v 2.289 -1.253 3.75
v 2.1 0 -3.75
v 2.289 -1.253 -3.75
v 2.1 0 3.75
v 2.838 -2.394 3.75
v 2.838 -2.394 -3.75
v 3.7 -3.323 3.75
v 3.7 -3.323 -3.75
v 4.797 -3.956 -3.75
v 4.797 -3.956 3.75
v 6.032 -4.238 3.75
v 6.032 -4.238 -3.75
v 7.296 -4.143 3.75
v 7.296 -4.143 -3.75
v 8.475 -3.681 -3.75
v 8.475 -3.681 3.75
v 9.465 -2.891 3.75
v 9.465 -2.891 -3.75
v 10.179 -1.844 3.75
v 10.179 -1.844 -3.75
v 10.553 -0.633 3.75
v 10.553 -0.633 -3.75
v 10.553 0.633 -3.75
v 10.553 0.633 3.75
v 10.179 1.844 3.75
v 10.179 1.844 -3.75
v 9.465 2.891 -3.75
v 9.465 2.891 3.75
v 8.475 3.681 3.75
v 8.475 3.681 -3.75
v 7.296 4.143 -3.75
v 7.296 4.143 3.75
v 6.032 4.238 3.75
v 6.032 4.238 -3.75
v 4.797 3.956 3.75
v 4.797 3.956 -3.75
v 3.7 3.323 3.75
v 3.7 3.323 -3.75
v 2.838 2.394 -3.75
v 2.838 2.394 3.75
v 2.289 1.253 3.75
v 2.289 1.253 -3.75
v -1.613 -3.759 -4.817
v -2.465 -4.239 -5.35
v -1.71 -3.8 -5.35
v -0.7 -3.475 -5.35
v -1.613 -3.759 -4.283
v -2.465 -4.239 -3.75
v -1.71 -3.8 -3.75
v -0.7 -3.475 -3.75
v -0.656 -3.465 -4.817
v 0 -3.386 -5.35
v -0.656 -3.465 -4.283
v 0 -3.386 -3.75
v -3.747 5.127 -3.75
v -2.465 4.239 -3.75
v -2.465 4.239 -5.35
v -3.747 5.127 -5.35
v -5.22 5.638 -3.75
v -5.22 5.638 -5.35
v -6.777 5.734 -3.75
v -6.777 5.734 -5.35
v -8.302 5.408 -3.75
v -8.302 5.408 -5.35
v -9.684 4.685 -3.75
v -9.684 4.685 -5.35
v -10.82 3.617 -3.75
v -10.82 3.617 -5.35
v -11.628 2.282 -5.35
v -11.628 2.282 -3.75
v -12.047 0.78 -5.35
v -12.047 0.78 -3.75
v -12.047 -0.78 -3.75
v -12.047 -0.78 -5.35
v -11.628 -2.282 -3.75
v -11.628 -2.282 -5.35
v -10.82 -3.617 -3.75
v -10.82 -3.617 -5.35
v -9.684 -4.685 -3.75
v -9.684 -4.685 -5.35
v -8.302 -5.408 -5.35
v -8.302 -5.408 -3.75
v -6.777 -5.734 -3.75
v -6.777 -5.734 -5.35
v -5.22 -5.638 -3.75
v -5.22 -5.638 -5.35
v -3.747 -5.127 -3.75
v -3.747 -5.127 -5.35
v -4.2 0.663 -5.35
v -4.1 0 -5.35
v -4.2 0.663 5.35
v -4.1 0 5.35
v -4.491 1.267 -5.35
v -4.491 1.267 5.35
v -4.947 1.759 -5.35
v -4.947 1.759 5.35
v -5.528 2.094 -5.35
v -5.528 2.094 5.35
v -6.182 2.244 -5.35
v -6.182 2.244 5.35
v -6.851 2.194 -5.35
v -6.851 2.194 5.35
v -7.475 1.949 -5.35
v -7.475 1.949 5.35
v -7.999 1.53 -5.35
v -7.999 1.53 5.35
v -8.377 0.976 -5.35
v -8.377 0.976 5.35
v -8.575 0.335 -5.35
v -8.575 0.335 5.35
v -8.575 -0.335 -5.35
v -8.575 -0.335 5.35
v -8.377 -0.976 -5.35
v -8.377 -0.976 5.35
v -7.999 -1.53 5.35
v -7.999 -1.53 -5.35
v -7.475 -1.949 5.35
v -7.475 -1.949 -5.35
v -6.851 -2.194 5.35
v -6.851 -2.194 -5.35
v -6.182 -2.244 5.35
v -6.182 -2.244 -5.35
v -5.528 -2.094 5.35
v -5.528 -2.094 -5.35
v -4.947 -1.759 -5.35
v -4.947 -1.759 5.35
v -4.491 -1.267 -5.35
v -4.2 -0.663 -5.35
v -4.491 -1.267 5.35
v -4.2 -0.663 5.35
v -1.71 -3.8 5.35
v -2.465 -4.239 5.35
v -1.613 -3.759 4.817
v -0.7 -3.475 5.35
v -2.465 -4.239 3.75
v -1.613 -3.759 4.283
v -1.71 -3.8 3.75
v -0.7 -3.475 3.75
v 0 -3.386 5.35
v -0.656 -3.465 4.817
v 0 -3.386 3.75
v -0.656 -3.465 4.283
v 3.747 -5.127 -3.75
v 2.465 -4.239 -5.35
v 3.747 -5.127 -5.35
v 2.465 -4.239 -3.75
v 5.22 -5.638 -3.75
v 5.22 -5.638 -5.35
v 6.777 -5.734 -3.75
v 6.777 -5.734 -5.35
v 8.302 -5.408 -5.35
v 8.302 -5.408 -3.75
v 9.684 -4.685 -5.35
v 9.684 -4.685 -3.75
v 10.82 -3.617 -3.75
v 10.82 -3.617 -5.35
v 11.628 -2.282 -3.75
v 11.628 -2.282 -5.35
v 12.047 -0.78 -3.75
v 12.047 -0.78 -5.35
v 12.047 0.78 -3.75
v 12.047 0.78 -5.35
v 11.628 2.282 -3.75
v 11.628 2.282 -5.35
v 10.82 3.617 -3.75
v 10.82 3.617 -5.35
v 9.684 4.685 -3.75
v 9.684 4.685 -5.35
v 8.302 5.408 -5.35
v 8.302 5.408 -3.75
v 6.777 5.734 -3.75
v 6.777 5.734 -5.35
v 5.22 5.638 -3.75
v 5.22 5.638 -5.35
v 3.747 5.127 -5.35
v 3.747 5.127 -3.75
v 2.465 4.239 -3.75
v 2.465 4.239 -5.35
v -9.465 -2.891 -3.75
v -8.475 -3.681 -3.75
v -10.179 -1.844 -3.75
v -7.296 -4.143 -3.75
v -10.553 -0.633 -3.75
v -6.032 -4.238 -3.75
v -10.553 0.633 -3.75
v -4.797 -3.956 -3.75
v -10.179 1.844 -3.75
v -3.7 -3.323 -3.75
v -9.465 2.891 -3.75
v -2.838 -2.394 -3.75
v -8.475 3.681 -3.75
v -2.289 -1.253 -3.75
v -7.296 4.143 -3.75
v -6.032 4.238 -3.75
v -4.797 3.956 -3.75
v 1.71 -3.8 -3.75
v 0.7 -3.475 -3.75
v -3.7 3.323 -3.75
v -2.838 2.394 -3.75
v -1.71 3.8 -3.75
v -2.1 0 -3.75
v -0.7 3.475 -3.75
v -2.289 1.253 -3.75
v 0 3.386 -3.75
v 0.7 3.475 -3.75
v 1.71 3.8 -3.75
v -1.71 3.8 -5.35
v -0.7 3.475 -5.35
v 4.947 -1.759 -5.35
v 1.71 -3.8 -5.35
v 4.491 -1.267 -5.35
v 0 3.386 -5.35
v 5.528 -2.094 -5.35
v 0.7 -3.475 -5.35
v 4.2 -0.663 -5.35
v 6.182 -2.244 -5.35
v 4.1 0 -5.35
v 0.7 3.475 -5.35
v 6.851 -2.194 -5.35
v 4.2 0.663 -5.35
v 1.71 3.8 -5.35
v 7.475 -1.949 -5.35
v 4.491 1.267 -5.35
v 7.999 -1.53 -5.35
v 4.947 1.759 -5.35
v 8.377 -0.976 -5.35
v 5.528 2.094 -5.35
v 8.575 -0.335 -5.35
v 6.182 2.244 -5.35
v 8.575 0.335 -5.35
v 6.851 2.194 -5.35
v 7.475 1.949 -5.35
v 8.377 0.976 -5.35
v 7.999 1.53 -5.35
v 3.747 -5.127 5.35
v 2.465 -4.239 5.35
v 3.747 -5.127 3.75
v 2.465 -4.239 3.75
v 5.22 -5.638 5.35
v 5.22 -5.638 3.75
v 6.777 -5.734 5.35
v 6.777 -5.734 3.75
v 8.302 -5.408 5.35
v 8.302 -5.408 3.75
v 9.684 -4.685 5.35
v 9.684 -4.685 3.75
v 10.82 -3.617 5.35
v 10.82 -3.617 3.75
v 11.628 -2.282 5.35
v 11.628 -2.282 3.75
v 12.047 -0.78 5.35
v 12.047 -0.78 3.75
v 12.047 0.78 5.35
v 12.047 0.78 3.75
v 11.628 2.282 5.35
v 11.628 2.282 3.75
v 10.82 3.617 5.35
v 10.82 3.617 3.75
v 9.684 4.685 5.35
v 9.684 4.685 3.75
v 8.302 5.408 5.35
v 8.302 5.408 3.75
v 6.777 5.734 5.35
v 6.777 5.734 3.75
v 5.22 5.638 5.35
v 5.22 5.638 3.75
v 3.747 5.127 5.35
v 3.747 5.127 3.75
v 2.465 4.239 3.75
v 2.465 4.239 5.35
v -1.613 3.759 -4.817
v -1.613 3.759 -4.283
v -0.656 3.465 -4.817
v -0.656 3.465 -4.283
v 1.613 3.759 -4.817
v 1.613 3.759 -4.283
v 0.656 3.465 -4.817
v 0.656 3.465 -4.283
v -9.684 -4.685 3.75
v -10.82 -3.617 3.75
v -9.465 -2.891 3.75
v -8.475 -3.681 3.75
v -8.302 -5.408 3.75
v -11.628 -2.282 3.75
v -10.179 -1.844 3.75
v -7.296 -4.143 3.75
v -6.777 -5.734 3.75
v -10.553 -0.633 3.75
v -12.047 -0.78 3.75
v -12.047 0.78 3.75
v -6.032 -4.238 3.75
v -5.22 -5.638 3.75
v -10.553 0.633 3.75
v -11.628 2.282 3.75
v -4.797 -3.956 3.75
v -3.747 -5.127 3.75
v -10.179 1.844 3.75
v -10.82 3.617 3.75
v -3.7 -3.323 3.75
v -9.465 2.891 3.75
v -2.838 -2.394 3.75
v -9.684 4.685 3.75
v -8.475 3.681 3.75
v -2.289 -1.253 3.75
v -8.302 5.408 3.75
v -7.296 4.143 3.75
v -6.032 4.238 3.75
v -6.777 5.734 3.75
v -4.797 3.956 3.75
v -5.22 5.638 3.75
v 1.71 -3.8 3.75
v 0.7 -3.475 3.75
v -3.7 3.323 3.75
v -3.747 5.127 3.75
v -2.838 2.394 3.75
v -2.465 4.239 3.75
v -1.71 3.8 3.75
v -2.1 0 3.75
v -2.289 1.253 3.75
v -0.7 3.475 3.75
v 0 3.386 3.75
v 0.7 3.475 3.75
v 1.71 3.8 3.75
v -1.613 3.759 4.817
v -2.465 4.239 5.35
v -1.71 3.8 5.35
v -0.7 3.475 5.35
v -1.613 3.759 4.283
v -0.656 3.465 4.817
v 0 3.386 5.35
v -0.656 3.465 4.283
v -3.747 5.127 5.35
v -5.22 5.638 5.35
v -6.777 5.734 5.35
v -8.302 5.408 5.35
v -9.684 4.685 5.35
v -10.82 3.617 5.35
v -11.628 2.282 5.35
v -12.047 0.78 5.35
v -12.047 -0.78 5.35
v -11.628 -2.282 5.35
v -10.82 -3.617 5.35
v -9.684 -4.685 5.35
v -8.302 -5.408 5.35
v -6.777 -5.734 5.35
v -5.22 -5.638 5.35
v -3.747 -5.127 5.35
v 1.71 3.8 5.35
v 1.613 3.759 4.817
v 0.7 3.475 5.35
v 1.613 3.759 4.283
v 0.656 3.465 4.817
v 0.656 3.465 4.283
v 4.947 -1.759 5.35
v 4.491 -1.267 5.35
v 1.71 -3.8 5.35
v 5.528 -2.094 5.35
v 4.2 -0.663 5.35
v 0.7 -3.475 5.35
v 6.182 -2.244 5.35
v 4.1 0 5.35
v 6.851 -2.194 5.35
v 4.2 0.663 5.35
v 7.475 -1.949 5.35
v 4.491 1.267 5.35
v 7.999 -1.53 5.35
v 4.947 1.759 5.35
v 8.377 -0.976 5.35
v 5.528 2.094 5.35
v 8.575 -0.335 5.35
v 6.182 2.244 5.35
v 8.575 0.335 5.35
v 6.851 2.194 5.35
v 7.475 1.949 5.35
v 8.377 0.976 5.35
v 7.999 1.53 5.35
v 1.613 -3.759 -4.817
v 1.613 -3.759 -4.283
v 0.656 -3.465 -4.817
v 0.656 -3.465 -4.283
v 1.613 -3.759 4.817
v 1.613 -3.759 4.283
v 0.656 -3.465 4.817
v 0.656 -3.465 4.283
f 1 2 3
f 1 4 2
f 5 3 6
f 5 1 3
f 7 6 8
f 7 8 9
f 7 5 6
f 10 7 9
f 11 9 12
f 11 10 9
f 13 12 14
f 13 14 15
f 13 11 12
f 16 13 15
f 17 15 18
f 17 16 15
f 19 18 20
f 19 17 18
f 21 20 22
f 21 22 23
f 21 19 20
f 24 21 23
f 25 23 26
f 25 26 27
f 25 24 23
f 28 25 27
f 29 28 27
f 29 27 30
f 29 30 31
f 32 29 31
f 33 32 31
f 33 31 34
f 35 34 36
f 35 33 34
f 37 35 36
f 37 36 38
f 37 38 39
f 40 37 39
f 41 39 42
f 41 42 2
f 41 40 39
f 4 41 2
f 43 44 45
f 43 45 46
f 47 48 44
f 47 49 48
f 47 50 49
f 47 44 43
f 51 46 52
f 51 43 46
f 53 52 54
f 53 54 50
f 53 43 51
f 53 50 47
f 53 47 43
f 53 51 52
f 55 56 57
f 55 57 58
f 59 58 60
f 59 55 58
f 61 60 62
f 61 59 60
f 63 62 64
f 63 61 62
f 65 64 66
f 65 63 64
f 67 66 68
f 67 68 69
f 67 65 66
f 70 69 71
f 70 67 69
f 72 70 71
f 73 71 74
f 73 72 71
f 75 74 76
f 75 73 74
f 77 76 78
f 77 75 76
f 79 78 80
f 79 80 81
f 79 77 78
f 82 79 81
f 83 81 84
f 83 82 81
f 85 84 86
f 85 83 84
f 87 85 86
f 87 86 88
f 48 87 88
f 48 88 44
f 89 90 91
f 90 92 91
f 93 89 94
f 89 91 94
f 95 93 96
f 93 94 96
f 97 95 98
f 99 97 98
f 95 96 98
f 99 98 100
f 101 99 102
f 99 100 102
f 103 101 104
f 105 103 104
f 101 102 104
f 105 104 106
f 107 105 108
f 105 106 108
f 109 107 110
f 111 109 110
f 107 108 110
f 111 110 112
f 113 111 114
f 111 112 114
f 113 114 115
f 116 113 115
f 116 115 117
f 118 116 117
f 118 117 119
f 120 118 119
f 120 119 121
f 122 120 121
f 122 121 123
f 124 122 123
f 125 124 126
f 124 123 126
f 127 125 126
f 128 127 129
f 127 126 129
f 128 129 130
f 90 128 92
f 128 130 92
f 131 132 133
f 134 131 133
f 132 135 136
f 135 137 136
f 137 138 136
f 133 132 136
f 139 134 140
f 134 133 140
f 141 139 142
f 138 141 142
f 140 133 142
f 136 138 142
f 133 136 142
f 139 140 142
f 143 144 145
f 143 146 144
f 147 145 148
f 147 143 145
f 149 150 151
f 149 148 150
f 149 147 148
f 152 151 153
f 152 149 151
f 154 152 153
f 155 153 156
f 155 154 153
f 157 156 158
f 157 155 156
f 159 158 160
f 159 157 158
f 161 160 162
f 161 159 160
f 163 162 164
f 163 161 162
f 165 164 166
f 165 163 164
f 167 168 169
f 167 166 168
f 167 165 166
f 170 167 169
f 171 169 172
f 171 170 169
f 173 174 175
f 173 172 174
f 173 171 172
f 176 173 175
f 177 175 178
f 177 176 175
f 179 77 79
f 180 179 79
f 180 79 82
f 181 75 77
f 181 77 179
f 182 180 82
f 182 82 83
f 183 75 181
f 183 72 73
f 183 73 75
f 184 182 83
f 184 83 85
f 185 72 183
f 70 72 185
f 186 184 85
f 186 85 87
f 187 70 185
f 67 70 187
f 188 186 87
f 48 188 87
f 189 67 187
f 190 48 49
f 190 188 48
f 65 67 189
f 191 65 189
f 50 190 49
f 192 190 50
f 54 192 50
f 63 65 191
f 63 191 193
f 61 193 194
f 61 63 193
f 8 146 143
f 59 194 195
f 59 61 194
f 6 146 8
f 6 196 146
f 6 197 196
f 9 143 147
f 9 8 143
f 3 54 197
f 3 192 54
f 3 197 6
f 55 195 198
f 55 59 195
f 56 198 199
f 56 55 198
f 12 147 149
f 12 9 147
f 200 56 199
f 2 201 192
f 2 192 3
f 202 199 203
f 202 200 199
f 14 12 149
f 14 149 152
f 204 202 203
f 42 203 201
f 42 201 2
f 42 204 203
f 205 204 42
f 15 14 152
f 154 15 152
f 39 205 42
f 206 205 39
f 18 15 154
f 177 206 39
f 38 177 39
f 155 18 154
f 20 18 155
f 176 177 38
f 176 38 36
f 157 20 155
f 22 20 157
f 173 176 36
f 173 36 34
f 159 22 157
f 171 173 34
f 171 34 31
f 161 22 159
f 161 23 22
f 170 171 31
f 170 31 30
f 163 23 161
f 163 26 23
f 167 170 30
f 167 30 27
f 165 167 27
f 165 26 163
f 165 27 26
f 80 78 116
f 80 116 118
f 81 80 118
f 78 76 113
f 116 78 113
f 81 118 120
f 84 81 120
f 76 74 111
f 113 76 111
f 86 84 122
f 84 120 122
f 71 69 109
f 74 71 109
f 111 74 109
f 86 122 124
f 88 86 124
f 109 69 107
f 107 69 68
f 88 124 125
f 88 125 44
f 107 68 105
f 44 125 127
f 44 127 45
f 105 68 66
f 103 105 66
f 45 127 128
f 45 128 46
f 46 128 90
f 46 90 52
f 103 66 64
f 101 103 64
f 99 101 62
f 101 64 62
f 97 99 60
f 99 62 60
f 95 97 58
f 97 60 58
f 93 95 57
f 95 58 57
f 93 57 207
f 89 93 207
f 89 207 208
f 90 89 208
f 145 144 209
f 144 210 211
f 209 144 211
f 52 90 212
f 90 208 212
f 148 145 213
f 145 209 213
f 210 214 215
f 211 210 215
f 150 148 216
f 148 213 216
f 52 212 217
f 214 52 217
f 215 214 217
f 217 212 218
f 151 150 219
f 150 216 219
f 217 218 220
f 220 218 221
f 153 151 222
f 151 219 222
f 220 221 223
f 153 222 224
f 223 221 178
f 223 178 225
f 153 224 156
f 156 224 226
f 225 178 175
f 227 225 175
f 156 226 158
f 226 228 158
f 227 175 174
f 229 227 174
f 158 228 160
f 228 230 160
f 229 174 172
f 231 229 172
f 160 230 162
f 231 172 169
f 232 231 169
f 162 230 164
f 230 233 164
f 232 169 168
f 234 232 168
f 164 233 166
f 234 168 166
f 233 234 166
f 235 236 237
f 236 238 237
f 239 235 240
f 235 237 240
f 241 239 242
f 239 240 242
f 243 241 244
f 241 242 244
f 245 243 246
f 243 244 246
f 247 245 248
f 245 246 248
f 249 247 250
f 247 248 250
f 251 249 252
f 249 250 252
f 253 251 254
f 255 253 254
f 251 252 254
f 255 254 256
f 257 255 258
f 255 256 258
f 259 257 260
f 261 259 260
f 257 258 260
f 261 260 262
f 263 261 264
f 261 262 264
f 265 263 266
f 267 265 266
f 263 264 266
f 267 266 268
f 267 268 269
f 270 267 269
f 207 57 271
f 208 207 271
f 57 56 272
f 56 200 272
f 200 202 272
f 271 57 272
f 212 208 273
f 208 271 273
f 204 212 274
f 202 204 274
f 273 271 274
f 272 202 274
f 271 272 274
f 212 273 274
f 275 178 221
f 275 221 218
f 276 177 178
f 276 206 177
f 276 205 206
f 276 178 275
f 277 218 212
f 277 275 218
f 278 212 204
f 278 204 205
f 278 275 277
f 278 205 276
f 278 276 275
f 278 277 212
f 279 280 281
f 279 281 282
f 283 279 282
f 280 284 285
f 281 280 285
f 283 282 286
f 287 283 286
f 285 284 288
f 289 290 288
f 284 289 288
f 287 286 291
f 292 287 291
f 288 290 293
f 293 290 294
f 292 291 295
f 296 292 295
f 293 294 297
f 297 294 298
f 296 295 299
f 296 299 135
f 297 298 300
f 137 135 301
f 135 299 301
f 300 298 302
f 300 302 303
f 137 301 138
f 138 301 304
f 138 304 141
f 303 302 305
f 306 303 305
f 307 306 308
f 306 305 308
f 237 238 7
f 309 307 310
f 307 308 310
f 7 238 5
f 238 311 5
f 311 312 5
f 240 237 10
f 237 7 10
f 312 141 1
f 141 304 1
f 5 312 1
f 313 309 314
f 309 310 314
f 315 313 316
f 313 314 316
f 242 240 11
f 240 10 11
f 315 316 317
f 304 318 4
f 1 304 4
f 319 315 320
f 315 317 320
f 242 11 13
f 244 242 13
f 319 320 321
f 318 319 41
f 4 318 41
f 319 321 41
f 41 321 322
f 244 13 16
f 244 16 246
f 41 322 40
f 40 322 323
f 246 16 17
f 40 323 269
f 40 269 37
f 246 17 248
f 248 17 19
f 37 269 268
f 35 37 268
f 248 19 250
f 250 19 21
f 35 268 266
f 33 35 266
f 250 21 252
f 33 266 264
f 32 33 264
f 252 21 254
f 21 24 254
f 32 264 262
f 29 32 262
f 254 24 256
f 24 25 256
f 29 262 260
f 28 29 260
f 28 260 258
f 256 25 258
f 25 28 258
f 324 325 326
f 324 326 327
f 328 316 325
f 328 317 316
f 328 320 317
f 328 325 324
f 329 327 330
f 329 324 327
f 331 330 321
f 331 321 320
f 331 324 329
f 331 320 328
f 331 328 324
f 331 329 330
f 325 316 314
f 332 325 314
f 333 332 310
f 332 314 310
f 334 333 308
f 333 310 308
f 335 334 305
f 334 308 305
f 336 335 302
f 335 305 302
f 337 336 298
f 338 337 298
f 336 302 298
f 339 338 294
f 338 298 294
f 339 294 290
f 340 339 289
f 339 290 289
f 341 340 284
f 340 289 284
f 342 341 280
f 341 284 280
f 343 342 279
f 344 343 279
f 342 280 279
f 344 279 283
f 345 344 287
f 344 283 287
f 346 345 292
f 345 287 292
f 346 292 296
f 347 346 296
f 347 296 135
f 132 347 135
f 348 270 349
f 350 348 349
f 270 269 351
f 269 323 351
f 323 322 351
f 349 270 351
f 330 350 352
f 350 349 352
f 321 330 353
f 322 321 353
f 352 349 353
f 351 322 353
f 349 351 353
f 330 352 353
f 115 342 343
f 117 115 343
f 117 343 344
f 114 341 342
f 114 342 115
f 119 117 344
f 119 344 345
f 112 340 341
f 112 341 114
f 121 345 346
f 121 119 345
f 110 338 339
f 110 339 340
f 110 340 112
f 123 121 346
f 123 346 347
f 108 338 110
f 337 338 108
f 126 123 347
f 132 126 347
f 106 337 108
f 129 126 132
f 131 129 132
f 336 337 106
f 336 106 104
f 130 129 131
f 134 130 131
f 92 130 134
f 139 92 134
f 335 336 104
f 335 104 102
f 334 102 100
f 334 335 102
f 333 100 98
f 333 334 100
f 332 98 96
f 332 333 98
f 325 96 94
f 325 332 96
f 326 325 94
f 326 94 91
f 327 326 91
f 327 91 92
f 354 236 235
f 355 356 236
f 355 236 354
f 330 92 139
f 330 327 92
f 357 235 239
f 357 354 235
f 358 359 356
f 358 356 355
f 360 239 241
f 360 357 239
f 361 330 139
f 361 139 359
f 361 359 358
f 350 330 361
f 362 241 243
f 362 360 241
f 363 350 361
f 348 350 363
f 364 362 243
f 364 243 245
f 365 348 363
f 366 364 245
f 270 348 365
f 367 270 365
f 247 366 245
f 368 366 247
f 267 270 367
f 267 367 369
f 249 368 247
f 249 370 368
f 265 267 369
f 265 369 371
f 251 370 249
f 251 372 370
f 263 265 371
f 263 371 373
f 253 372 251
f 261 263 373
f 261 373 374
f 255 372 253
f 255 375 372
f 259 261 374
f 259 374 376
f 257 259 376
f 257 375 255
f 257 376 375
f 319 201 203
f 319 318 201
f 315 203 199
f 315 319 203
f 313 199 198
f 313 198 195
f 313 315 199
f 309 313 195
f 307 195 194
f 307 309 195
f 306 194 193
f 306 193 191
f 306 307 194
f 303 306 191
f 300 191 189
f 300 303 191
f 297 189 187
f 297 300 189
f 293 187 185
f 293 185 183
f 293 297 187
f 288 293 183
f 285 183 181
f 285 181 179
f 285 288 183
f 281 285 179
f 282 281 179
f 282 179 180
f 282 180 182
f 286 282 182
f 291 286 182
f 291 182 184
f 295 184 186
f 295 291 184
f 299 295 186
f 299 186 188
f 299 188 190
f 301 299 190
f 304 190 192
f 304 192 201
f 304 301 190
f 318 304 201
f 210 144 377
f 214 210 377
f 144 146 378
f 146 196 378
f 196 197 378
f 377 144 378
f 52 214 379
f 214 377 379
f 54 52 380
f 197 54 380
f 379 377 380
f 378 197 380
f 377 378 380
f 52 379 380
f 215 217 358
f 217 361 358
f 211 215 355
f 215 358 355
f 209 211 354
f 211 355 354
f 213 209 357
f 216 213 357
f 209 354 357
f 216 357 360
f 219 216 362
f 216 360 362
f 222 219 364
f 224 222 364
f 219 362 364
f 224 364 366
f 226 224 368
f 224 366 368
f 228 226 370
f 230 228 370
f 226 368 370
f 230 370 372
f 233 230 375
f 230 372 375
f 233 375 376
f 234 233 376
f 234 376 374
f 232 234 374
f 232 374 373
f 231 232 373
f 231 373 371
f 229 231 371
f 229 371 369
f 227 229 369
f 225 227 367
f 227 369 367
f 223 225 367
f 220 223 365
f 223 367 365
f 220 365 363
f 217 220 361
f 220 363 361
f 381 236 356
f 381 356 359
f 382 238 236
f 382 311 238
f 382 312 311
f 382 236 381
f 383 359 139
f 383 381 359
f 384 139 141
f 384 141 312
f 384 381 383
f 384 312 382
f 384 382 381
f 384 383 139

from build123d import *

# Parameters (mm, degrees)
SKETCH_1_R        = 4.25
SKETCH_1_R_2      = 2.25
EXTRUDE_1_DEPTH   = 3.75
EXTRUDE_1_2_DEPTH = 3.75
SKETCH_2_R        = 5.75
SKETCH_2_R_2      = 4.25
SKETCH_2_R_3      = 2.25
EXTRUDE_3_DEPTH   = 1.6


with BuildPart() as part:
    # 草图1 → 凸台-拉伸1 (new body)
    with BuildSketch(Plane.XY):
        with Locations((-6.35, 0)):
            Circle(SKETCH_1_R)
        with Locations((-6.35, 0)):
            Circle(SKETCH_1_R_2, mode=Mode.SUBTRACT)
    extrude_1 = extrude(amount=EXTRUDE_1_DEPTH)



with BuildPart() as body_2:
    # 草图1 → Extrude 1 2 (new body)
    with BuildSketch(Plane.XY):
        with Locations(Location((6.35, 0, 0), (0, 0, 180))):
            Circle(SKETCH_1_R)
        with Locations(Location((6.35, 0, 0), (0, 0, 180))):
            Circle(SKETCH_1_R_2, mode=Mode.SUBTRACT)
    extrude_1_2 = extrude(amount=EXTRUDE_1_2_DEPTH)


with BuildPart() as part_1:
    add(part.part)

    add(body_2.part)  # 凸台-拉伸3 merges body 2
    # 草图2 → 凸台-拉伸3 (add)
    # profile 1 of 4: a face of its own
    with BuildSketch(Plane.XY.offset(3.75)):
        with Locations((-6.35, 0)):
            Circle(SKETCH_2_R)
        with Locations((-6.35, 0)):
            Circle(SKETCH_2_R_2, mode=Mode.SUBTRACT)
    # profile 2 of 4: a face of its own
    with BuildSketch(Plane.XY.offset(3.75)):
        with Locations((-6.35, 0)):
            Circle(SKETCH_2_R_2)
        with Locations((-6.35, 0)):
            Circle(SKETCH_2_R_3, mode=Mode.SUBTRACT)
    # profile 3 of 4: a face of its own
    with BuildSketch(Plane.XY.offset(3.75)):
        with BuildLine():
            ThreePointArc((-2.464522189, 4.238580208), (-1.086731177, 2.315275641), (-0.6, 0))
            ThreePointArc((-0.6, 0), (-1.086731177, -2.315275641), (-2.464522189, -4.238580208))
            add(Edge.make_bspline(
                [(-2.464522189, -4.238580208), (-1.801147303, -3.67793909), (-0.370790644, -3.34588107), (0, -3.386350938)],
                knots=[0, 0, 0, 0, 1, 1, 1, 1], degree=3))
            add(Edge.make_bspline(
                [(2.464522189, -4.238580208), (1.801147303, -3.67793909), (0.370790644, -3.34588107), (0, -3.386350938)],
                knots=[0, 0, 0, 0, 1, 1, 1, 1], degree=3))
            ThreePointArc((2.464522189, -4.238580208), (0.6, 0), (2.464522189, 4.238580208))
            add(Edge.make_bspline(
                [(2.464522189, 4.238580208), (1.801147303, 3.67793909), (0.370790644, 3.34588107), (0, 3.386350938)],
                knots=[0, 0, 0, 0, 1, 1, 1, 1], degree=3))
            add(Edge.make_bspline(
                [(-2.464522189, 4.238580208), (-1.801147303, 3.67793909), (-0.370790644, 3.34588107), (0, 3.386350938)],
                knots=[0, 0, 0, 0, 1, 1, 1, 1], degree=3))
        make_face()
    # profile 4 of 4: a face of its own
    with BuildSketch(Plane.XY.offset(3.75)):
        with Locations((6.35, 0)):
            Circle(SKETCH_2_R)
        with Locations(Location((6.35, 0, 0), (0, 0, 180))):
            Circle(SKETCH_2_R_3, mode=Mode.SUBTRACT)
    extrude_3 = extrude(amount=EXTRUDE_3_DEPTH)

    # 镜向2: 凸台-拉伸1, Extrude 1 2, 凸台-拉伸3 across plane
    add(extrude_1.mirror(Plane(origin=(0, 0, 0), x_dir=(1, 0, 0), z_dir=(0, 0, -1))))
    add(extrude_1_2.mirror(Plane(origin=(0, 0, 0), x_dir=(1, 0, 0), z_dir=(0, 0, -1))))
    add(extrude_3.mirror(Plane(origin=(0, 0, 0), x_dir=(1, 0, 0), z_dir=(0, 0, -1))))


solid = part_1.part
